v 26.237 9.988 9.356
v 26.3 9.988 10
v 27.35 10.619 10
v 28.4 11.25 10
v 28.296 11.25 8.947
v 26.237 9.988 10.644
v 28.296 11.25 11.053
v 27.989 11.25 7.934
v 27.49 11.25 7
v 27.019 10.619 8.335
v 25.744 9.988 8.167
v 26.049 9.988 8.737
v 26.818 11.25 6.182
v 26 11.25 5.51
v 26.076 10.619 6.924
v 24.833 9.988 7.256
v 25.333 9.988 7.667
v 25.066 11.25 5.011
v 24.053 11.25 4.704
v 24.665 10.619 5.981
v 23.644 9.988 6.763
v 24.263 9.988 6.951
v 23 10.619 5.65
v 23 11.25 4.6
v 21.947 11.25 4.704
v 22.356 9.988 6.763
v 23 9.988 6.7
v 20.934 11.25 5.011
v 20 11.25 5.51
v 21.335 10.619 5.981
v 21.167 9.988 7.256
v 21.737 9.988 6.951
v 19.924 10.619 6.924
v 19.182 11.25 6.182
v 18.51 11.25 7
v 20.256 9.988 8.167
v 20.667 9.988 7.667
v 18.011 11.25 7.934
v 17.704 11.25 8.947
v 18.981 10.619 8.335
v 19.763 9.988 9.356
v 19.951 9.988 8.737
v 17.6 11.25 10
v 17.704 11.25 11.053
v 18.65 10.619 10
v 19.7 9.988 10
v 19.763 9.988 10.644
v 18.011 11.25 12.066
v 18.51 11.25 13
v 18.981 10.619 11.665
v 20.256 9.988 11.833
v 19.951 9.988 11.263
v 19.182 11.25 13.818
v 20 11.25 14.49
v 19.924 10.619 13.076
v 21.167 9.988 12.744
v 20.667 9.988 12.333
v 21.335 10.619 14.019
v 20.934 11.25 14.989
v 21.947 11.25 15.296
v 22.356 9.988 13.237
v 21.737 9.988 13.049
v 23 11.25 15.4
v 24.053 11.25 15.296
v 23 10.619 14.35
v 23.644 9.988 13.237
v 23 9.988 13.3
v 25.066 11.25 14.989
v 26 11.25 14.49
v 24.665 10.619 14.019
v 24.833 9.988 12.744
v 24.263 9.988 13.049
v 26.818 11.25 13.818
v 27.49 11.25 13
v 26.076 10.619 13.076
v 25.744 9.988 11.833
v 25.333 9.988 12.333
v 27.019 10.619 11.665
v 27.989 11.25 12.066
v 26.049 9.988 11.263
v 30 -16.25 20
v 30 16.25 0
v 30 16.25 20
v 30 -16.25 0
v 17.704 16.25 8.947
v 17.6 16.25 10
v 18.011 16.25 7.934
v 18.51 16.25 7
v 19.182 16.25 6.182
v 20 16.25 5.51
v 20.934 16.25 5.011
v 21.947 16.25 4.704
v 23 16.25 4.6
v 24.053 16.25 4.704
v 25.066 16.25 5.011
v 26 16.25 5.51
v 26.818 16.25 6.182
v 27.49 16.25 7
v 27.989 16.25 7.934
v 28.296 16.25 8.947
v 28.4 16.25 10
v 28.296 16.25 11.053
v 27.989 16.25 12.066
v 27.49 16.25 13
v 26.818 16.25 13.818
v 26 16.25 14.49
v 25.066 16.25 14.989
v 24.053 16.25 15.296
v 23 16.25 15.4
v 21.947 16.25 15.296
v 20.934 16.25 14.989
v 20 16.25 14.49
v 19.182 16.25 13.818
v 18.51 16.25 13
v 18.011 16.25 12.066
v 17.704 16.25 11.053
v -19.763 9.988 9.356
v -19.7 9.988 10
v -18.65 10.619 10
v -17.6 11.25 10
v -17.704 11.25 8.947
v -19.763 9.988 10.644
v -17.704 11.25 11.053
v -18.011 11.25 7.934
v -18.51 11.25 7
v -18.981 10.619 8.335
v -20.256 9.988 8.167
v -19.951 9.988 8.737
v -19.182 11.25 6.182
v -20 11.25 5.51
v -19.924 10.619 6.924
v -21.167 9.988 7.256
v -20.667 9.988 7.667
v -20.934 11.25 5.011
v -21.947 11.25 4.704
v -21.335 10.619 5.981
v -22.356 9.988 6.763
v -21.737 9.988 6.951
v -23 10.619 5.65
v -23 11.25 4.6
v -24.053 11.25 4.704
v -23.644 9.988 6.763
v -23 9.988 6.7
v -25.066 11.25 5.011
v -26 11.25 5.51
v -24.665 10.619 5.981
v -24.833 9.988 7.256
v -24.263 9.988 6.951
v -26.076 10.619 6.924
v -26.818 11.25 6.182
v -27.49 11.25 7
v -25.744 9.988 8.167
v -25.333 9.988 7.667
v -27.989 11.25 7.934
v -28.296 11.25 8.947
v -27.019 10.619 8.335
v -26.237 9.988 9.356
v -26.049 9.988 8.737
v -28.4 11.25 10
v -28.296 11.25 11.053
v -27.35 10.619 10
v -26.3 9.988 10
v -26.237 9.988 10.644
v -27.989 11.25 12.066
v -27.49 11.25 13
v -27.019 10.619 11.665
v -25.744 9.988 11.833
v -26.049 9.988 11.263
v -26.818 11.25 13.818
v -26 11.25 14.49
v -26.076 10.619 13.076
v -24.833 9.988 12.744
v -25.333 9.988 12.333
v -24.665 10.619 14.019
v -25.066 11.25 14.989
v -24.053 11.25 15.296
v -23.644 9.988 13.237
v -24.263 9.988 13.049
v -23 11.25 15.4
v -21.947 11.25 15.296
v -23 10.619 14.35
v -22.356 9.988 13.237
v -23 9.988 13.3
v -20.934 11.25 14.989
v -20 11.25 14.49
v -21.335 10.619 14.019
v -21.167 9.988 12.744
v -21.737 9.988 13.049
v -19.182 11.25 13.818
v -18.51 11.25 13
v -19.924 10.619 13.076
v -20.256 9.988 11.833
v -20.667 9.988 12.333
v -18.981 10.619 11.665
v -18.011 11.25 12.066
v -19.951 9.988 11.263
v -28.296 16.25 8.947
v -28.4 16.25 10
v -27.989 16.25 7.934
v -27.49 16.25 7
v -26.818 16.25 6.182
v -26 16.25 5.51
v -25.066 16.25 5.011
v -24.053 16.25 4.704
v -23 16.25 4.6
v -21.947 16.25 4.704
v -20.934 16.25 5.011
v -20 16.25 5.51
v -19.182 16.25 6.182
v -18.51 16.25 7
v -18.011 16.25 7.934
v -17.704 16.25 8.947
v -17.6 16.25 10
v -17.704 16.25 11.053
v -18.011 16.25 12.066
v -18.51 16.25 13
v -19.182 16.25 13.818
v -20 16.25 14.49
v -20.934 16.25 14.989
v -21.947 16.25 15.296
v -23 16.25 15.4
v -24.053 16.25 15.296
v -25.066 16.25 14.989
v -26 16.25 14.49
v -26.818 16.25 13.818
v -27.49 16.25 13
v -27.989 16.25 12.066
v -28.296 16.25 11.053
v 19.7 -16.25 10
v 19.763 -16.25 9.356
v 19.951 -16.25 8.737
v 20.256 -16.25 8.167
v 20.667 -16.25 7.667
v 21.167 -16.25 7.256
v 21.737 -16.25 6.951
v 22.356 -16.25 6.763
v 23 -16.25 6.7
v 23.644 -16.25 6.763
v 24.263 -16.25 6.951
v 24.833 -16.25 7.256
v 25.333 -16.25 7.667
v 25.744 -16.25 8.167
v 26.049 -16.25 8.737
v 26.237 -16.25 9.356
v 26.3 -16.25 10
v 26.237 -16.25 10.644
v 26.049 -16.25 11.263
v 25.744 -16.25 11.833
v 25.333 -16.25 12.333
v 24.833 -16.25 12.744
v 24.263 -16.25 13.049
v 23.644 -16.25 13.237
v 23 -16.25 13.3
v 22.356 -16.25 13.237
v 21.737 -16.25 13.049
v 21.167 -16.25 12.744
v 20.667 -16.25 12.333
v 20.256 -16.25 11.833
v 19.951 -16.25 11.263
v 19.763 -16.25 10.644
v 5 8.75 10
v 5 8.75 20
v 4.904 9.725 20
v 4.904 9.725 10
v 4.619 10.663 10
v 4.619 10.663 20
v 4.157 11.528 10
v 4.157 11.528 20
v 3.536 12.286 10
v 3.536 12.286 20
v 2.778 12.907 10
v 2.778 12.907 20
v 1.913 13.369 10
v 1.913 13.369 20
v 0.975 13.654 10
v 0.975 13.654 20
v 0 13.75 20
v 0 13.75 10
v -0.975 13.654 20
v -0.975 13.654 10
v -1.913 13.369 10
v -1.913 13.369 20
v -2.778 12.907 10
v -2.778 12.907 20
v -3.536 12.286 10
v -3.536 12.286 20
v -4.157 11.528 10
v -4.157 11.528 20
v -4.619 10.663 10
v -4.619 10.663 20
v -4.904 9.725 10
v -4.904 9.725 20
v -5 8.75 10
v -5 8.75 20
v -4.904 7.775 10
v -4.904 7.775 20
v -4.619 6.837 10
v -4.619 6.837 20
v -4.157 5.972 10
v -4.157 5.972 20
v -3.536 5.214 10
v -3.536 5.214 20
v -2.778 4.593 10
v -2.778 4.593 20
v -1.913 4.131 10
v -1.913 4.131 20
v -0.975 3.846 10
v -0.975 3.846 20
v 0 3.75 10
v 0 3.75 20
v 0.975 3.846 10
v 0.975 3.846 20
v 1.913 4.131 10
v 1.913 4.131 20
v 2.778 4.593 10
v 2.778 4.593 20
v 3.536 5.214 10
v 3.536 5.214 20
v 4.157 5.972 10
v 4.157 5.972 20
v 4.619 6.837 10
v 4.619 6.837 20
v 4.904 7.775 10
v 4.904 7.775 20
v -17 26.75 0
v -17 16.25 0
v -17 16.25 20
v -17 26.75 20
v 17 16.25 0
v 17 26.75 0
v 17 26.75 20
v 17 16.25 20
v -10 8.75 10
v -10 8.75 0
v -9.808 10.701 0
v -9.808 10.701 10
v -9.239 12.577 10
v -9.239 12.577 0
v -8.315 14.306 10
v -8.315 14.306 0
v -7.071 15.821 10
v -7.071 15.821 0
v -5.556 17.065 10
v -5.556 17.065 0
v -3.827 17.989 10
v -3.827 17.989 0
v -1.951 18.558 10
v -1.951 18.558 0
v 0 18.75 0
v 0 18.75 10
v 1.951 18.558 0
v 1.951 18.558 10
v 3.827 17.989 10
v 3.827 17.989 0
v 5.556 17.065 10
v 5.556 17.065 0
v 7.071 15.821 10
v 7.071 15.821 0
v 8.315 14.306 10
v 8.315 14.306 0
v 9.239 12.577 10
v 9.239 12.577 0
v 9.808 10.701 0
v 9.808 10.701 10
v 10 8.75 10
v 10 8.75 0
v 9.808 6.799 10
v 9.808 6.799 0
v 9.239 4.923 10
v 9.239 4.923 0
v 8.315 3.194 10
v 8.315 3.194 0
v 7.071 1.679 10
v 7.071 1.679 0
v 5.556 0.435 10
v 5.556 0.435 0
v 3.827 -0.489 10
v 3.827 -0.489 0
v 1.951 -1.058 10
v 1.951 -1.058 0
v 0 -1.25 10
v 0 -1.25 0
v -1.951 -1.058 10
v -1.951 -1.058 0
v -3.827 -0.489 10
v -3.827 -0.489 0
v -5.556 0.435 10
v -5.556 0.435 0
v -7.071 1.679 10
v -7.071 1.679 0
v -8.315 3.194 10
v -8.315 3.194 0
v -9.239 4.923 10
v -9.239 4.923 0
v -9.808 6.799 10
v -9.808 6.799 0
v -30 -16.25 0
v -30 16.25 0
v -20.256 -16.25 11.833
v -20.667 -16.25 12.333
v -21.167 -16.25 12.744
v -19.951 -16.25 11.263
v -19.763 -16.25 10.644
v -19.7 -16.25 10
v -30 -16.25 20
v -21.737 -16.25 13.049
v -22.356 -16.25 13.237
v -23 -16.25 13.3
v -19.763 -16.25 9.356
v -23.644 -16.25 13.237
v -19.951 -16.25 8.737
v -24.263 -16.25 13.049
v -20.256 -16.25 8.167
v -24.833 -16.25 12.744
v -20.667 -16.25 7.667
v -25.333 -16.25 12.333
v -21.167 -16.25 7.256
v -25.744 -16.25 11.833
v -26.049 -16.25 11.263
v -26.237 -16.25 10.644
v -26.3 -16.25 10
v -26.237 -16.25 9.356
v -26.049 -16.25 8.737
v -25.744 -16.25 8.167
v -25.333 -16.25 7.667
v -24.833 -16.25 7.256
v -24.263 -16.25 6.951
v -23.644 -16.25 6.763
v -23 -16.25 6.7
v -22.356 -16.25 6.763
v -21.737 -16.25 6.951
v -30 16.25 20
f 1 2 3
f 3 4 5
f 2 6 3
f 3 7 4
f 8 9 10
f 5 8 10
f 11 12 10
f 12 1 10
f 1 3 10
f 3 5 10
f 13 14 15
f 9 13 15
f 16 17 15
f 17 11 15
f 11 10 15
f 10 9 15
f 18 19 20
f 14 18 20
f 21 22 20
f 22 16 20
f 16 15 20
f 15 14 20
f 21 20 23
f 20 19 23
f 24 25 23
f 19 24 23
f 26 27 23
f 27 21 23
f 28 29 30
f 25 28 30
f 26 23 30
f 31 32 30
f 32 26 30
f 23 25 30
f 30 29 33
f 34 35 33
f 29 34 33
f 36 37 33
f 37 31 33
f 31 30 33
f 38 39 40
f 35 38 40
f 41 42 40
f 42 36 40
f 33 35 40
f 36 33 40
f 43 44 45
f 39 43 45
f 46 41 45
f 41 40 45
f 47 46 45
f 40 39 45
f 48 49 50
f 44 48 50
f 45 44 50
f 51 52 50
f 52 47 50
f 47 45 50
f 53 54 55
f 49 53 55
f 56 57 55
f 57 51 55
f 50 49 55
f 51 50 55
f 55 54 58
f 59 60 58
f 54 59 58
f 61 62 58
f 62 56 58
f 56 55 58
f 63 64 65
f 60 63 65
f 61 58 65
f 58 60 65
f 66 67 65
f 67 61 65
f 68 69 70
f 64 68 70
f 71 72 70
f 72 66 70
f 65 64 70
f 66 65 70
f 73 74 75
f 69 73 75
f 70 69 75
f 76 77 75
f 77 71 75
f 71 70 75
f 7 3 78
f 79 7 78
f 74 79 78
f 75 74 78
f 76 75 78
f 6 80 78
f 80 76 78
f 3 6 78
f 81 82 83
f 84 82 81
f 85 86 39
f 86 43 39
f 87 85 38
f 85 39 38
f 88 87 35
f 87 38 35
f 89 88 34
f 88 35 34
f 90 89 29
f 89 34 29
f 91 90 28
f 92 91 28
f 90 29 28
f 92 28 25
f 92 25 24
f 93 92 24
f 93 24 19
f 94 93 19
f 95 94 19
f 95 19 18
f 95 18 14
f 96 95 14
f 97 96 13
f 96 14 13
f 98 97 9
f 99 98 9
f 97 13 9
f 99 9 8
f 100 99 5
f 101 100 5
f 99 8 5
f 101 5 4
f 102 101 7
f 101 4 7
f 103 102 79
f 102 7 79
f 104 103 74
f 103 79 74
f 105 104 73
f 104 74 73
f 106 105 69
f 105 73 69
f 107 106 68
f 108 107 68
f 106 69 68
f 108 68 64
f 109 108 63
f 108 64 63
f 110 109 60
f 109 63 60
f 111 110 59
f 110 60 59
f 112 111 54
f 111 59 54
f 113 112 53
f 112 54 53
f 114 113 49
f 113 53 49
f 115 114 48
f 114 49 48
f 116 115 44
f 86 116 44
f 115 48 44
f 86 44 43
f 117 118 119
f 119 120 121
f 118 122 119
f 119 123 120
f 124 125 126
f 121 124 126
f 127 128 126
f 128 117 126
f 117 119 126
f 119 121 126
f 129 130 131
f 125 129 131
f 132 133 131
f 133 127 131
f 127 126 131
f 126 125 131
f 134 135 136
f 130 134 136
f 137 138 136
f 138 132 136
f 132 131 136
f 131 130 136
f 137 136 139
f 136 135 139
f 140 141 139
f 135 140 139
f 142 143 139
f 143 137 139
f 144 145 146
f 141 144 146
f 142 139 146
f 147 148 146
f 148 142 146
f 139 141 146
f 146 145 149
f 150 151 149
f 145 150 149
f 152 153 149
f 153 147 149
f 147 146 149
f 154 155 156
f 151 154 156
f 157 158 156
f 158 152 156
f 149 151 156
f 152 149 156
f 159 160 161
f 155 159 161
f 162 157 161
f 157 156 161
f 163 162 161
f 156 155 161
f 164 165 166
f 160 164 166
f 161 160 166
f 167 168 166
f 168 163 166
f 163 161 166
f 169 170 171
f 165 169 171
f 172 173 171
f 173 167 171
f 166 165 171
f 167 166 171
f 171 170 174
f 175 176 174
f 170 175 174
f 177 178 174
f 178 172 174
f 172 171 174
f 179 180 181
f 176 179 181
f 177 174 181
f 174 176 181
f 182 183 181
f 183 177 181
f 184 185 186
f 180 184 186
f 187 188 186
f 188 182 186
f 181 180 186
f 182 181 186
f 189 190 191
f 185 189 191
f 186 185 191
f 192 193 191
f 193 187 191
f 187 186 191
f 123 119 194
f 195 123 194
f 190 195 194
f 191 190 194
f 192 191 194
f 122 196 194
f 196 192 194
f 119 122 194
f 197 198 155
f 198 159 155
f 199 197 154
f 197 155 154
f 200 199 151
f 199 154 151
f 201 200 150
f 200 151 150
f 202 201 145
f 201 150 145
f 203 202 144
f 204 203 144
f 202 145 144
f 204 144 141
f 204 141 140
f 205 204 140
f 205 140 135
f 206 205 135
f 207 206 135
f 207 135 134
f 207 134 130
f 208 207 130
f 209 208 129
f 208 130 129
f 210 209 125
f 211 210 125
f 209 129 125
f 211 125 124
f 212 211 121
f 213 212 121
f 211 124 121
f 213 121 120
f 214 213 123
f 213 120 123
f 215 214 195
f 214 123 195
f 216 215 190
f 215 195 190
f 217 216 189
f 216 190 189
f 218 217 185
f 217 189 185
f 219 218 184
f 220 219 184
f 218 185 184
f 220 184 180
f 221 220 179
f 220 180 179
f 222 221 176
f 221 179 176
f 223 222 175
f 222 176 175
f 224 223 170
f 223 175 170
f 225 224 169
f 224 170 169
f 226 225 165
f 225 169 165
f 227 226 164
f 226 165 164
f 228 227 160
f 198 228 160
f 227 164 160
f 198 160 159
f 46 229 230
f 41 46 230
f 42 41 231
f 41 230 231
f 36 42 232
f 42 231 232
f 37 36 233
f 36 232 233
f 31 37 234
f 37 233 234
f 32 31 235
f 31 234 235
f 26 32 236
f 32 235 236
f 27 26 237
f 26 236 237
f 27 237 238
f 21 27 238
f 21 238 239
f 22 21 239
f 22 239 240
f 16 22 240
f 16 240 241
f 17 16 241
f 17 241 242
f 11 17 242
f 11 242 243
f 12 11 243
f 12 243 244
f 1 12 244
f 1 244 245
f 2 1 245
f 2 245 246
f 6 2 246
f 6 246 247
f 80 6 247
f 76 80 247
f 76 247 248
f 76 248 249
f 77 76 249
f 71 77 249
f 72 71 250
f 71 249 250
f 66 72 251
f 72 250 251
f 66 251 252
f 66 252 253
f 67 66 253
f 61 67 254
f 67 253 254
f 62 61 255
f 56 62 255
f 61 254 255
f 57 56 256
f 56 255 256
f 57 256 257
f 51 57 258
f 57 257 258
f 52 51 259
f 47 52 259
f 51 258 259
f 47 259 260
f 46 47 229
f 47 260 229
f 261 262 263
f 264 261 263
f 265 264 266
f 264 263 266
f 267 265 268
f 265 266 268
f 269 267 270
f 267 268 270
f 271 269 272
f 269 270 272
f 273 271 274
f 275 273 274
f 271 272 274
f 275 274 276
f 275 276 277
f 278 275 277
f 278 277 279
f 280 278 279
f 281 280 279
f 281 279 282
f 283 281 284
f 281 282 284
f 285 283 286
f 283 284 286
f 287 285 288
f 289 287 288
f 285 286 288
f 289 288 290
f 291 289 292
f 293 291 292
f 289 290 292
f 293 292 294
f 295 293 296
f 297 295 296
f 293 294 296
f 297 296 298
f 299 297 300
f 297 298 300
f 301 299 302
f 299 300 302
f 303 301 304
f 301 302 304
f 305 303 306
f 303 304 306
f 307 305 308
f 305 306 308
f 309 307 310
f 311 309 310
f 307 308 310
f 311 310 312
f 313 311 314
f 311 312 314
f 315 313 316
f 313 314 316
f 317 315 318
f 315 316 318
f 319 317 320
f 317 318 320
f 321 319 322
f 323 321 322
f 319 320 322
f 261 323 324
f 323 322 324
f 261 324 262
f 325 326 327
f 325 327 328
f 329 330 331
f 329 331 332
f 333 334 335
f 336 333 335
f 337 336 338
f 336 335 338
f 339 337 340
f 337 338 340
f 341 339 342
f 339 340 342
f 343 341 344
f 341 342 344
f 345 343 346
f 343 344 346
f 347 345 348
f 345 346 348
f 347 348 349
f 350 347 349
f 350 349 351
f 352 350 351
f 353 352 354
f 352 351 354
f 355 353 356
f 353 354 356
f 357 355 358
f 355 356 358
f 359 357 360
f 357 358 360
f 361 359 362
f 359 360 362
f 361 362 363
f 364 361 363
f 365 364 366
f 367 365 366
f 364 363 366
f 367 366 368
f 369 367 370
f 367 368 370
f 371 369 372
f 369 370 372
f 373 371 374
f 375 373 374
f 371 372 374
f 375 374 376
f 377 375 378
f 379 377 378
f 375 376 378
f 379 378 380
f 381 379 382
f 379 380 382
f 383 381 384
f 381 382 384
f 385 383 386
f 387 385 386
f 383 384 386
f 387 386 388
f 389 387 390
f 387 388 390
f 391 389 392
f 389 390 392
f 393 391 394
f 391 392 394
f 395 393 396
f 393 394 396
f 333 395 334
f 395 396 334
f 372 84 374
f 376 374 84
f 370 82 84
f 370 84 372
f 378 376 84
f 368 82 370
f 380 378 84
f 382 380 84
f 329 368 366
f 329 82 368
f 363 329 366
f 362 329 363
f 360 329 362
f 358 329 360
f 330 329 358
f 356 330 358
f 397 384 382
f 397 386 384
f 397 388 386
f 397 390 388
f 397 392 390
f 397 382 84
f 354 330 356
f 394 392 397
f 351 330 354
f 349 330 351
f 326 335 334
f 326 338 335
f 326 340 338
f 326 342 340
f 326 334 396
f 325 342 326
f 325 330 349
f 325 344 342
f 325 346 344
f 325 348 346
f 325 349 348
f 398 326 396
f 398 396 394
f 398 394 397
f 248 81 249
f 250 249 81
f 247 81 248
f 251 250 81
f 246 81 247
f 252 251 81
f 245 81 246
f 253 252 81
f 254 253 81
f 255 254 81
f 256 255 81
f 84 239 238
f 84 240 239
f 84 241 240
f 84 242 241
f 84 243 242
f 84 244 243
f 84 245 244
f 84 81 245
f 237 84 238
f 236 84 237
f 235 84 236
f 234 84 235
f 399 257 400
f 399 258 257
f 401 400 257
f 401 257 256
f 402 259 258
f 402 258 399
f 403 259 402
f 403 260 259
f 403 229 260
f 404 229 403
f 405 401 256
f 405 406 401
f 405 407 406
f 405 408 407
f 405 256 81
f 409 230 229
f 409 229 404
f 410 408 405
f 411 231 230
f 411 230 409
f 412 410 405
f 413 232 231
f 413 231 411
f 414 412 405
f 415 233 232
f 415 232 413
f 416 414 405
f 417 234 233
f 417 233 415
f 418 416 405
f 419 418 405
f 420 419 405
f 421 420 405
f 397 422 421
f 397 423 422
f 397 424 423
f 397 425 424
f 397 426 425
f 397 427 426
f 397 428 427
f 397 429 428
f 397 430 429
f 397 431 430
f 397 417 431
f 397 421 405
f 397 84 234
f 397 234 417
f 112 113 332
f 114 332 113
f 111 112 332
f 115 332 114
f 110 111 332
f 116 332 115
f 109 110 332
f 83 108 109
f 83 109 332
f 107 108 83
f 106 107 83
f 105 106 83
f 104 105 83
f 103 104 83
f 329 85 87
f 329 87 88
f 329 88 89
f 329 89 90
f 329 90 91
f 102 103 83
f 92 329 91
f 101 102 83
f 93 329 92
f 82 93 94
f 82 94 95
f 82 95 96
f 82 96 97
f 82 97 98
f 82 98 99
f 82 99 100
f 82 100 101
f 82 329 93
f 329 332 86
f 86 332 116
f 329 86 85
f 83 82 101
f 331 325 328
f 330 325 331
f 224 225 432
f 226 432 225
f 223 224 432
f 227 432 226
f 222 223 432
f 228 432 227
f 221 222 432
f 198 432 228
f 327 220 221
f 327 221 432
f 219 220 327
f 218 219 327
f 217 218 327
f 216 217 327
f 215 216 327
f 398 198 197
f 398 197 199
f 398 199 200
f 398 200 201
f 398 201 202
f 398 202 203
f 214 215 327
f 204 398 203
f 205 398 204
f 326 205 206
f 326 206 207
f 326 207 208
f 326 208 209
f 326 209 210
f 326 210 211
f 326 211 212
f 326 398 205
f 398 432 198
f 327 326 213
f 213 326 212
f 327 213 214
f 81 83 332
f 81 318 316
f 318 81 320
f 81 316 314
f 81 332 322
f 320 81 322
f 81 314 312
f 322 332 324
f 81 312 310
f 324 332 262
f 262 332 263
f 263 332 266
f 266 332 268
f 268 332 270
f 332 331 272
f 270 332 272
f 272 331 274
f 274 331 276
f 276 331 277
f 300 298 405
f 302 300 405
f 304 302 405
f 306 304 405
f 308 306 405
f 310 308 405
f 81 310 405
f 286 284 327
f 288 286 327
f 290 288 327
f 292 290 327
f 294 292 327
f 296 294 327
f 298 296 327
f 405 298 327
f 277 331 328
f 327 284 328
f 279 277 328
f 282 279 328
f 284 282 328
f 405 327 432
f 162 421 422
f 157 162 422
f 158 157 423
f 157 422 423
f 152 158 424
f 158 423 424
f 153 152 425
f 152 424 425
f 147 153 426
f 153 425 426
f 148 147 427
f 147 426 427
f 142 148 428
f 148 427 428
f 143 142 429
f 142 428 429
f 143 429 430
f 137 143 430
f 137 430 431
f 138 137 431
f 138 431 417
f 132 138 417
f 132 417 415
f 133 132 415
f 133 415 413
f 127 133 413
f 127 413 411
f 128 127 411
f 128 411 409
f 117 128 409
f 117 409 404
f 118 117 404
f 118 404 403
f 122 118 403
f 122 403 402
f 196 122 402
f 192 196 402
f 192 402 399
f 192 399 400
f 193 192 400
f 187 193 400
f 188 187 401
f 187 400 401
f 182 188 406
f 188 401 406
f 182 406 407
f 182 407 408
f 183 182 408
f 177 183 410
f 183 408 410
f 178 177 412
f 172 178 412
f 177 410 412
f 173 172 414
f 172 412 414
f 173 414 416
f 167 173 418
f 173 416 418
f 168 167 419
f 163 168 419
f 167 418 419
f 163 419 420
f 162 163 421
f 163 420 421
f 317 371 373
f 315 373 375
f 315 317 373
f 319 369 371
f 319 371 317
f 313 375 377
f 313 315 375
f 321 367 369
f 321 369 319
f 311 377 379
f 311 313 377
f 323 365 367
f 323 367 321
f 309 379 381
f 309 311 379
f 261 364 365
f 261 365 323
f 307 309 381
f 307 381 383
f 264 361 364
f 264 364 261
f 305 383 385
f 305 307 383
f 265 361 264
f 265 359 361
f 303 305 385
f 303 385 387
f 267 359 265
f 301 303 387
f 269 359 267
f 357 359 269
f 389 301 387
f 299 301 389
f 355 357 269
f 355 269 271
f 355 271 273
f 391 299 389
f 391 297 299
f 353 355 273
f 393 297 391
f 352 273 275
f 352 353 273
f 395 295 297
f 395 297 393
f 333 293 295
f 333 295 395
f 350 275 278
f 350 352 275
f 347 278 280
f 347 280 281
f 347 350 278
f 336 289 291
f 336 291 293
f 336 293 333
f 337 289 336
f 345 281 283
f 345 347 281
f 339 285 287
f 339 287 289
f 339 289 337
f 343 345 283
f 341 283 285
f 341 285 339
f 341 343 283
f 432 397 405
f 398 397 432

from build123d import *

# Parameters (mm, degrees)
BOSS_EXTRUDE1_DEPTH              = 20
SKETCH2_R                        = 5
CUT_EXTRUDE1_DEPTH               = 10
SKETCH3_R                        = 10
CUT_EXTRUDE2_DEPTH               = 10
F_10_8_10_8_DIAMETER_HOLE1_D     = 10.8
F_10_8_10_8_DIAMETER_HOLE1_DEPTH = 5
F_10_8_10_8_DIAMETER_HOLE1_TIP   = 3.244647343
F_6_6_6_6_DIAMETER_HOLE1_D       = 6.6


with BuildPart() as part:
    # Sketch1 → Boss-Extrude1 (new body)
    with BuildSketch(Plane.XY):
        Polygon((-17, 16.25), (-17, 26.75), (17, 26.75), (17, 16.25), (30, 16.25), (30, -16.25), (-30, -16.25), (-30, 16.25), align=None)
    extrude(amount=BOSS_EXTRUDE1_DEPTH)

    # Sketch2 → Cut-Extrude1 (cut)
    with BuildSketch(Plane.XY.offset(20)):
        with Locations((0, 8.75)):
            Circle(SKETCH2_R)
    extrude(amount=-CUT_EXTRUDE1_DEPTH, mode=Mode.SUBTRACT)

    # Sketch3 → Cut-Extrude2 (cut)
    with BuildSketch(Plane(origin=(0, 0, 0), x_dir=(-1, 0, 0), z_dir=(0, 0, -1))):
        with Locations((0, 8.75)):
            Circle(SKETCH3_R)
    extrude(amount=-CUT_EXTRUDE2_DEPTH, mode=Mode.SUBTRACT)

    # Ø10.8 (10.8) Diameter Hole1
    with Locations(Plane(origin=(0, 16.25, 0), x_dir=(1, 0, 0), z_dir=(0, 1, 0))):
        with Locations((-23, -10), (23, -10)):
            Hole(F_10_8_10_8_DIAMETER_HOLE1_D / 2, depth=F_10_8_10_8_DIAMETER_HOLE1_DEPTH)
            with Locations((0, 0, -(F_10_8_10_8_DIAMETER_HOLE1_DEPTH + F_10_8_10_8_DIAMETER_HOLE1_TIP / 2))):  # 118° drill point
                Cone(0, F_10_8_10_8_DIAMETER_HOLE1_D / 2, F_10_8_10_8_DIAMETER_HOLE1_TIP, mode=Mode.SUBTRACT)

    # Ø6.6 (6.6) Diameter Hole1 (through all)
    with Locations(Plane(origin=(0, 16.25, 0), x_dir=(1, 0, 0), z_dir=(0, 1, 0))):
        with Locations((-23, -10), (23, -10)):
            Hole(F_6_6_6_6_DIAMETER_HOLE1_D / 2)


solid = part.part
